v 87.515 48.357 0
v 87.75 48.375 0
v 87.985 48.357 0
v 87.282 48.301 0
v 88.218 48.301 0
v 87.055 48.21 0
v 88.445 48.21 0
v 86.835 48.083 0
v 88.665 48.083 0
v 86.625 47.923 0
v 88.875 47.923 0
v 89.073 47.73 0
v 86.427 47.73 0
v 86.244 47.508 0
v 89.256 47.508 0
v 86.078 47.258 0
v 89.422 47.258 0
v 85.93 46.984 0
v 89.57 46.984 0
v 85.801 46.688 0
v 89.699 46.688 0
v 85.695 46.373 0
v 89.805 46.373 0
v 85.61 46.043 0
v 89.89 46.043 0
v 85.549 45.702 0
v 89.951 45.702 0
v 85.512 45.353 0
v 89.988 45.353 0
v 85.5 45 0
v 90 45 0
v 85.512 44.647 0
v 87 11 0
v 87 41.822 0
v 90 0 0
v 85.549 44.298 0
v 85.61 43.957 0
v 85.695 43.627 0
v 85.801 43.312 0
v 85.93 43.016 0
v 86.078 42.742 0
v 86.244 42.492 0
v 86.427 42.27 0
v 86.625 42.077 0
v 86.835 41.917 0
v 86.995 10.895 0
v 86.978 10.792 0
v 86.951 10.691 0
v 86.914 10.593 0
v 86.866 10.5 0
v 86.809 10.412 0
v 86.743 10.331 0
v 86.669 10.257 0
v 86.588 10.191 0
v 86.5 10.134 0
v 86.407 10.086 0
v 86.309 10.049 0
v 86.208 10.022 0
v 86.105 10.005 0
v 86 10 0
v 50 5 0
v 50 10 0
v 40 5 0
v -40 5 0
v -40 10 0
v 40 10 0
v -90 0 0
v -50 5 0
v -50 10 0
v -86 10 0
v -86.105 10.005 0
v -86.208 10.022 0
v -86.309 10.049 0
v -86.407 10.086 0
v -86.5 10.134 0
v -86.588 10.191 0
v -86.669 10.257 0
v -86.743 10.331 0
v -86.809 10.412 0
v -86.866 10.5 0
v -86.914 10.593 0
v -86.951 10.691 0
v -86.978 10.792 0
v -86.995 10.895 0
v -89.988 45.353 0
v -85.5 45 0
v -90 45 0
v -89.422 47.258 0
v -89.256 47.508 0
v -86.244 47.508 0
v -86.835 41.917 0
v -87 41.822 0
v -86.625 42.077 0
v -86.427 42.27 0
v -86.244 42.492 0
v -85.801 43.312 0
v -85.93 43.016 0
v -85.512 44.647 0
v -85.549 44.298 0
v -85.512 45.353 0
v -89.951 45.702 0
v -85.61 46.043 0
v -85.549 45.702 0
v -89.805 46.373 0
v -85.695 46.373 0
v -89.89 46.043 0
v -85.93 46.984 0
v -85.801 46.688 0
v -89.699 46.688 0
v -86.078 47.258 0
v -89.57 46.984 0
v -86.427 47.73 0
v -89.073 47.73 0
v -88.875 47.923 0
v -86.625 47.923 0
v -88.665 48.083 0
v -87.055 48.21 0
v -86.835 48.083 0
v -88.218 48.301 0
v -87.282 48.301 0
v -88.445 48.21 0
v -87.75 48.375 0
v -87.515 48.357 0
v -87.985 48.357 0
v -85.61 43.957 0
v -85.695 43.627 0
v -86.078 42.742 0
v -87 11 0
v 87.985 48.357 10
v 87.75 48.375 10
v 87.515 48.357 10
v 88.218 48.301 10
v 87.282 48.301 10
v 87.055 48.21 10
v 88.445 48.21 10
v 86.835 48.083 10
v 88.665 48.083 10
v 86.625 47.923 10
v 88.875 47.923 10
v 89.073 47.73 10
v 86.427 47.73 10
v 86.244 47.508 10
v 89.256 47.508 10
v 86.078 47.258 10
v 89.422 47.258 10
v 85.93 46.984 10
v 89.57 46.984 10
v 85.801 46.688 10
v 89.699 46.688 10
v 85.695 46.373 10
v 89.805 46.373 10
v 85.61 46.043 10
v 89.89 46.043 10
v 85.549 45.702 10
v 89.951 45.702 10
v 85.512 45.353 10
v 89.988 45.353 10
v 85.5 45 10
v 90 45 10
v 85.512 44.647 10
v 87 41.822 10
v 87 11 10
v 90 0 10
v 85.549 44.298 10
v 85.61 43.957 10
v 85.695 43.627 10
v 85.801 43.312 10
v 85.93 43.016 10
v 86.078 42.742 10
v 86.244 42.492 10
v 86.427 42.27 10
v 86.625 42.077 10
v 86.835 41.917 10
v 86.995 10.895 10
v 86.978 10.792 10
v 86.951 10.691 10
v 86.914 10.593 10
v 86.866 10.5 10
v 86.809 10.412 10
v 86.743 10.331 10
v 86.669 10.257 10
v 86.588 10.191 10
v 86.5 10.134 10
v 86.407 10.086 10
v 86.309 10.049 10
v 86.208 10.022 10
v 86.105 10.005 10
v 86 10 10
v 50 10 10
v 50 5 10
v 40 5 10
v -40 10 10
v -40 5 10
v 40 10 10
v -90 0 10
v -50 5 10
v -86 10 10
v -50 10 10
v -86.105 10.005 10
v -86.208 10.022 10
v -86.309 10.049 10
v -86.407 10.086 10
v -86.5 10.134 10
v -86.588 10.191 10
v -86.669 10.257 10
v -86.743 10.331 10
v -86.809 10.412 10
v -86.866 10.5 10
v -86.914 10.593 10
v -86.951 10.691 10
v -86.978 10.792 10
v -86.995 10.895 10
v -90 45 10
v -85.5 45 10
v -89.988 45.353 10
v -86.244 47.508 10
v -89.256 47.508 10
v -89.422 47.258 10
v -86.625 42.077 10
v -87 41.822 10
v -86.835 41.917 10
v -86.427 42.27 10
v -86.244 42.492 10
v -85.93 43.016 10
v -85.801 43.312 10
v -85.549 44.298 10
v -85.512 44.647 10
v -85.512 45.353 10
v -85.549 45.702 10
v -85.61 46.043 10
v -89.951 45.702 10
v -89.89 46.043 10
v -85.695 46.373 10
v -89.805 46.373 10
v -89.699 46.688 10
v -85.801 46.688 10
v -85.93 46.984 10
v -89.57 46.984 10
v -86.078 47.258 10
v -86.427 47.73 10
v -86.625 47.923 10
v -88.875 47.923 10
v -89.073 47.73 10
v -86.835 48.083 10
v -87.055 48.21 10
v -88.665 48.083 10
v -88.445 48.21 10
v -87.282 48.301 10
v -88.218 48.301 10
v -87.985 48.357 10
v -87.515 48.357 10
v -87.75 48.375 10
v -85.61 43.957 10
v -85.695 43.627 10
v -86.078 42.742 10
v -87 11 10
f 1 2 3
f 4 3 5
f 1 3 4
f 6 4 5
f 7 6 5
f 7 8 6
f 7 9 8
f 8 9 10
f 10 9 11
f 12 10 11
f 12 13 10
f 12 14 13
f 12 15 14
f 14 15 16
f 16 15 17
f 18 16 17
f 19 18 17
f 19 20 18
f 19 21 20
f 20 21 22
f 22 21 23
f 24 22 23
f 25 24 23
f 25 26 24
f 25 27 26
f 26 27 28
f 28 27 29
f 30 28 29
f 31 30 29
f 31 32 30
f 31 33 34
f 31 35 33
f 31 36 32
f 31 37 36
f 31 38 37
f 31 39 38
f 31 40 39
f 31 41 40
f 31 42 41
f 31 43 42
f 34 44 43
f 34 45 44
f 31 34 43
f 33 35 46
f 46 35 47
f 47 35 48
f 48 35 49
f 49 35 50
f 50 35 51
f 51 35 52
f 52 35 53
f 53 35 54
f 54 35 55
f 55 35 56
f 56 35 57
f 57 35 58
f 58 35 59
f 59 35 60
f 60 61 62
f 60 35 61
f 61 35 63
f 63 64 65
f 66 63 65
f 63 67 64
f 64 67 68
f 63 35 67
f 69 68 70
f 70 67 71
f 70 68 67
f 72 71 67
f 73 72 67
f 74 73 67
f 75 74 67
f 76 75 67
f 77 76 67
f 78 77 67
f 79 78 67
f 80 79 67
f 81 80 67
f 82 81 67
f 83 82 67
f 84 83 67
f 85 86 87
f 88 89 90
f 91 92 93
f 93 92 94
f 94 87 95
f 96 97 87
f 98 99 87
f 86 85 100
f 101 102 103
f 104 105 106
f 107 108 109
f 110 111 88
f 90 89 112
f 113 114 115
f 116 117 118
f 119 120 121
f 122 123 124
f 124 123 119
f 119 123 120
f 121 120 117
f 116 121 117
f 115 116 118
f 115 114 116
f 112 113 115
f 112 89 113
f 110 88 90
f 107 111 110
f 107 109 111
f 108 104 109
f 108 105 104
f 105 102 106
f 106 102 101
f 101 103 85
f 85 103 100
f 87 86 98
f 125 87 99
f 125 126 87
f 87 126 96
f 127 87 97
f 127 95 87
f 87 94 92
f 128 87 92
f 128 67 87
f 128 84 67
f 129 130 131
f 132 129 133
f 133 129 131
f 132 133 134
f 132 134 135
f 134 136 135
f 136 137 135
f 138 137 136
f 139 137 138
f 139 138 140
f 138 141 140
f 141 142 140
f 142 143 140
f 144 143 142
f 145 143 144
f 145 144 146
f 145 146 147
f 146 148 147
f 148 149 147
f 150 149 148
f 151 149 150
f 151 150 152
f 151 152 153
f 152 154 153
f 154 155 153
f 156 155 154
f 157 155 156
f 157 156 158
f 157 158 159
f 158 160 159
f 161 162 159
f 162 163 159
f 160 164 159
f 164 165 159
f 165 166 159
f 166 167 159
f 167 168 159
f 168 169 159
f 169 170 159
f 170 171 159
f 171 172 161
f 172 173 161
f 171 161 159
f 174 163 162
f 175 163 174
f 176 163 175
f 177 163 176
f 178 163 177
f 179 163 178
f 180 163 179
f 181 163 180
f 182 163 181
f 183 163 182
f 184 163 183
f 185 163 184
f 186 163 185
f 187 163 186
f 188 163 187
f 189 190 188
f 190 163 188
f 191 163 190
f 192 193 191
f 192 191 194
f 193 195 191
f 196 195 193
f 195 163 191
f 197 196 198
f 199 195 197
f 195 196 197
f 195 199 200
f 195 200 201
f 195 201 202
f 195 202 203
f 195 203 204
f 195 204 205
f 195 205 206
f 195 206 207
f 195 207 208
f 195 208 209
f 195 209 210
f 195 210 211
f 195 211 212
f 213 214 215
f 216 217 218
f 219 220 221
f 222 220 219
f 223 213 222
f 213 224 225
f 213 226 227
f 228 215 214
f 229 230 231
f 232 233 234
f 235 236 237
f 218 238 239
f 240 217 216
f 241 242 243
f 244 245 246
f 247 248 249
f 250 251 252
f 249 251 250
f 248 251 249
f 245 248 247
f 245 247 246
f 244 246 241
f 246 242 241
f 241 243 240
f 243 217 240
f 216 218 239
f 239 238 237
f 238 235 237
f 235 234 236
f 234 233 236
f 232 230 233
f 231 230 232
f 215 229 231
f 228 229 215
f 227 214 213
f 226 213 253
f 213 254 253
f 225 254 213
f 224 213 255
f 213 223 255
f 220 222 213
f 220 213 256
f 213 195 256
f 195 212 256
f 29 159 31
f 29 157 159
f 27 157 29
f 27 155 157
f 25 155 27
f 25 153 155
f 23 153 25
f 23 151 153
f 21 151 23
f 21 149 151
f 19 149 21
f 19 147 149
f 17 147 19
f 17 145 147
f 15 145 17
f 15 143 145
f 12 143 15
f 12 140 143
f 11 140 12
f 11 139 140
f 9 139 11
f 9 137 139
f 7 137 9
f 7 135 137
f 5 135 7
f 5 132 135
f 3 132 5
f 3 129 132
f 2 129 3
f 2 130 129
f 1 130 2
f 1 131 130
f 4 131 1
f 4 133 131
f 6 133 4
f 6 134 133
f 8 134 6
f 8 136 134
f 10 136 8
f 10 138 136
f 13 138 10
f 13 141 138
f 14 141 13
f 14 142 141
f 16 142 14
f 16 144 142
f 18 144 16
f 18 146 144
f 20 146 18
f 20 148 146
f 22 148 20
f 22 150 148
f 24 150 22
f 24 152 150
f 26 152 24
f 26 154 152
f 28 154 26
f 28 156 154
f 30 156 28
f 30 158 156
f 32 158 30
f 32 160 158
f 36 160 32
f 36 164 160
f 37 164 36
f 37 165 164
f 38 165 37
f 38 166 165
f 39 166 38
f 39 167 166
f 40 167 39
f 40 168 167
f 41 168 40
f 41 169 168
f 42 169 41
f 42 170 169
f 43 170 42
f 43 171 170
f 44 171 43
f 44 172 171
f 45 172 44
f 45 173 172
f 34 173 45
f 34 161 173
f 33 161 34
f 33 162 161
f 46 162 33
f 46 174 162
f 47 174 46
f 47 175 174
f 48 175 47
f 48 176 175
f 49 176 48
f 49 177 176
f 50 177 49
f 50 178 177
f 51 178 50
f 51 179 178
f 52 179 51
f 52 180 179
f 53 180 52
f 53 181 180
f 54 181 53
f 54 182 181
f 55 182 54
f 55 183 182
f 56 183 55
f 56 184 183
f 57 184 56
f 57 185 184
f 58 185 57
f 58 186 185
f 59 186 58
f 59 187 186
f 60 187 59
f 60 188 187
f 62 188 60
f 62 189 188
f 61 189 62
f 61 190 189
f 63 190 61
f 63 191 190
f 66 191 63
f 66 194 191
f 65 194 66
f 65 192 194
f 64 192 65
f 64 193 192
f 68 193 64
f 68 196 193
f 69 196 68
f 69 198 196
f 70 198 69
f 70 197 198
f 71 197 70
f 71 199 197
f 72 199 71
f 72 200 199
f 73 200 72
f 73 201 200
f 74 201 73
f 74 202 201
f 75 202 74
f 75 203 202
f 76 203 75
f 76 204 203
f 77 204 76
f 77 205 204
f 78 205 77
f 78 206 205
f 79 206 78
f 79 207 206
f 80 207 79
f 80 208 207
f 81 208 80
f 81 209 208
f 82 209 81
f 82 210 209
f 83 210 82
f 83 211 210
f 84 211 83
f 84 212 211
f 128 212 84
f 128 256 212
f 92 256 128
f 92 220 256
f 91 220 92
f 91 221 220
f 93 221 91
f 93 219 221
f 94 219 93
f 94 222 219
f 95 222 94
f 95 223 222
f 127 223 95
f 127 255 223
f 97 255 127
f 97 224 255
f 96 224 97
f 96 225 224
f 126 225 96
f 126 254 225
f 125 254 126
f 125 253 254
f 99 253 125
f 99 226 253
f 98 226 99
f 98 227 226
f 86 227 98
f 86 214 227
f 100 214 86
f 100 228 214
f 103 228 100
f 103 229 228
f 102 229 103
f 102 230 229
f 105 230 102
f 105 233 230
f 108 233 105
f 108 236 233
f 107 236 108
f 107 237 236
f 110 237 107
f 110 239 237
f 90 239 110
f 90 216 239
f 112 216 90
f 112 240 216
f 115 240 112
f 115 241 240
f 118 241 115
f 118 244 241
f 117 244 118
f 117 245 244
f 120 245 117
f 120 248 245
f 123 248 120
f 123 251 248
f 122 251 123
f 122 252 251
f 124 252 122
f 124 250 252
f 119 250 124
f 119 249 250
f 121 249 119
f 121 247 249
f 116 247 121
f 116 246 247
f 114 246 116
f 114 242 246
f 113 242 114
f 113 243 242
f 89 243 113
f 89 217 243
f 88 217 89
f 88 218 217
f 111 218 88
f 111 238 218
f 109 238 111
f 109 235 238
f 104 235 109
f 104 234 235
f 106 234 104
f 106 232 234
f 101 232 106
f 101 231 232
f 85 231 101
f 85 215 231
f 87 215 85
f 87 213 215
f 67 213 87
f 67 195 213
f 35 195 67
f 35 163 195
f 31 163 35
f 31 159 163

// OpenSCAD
$fn = 60;


// Dimensions of the power supply, slightly rounded up
power_supply_length = 174;
power_supply_width  =  70;
power_supply_height =  35;

// Material strength
rigid_base = 5;
flex_width = 3;
width      = 10;

// Dimensions of printed parts
length_inner = power_supply_length;
length_total = length_inner + flex_width * 2;
height_inner = power_supply_height;
height_total = height_inner + rigid_base * 2;


holder();


module holder() {
    base_height = height_total - height_inner;

    linear_extrude(width)
    difference() {
        union() {
            polygon([
                [-length_total / 2, 0],
                [ length_total / 2, 0],
                [ length_total / 2, height_total],
                [ length_inner / 2, height_total],
                [ length_inner / 2, base_height],
                [-length_inner / 2, base_height],
                [-length_inner / 2, height_total],
                [-length_total / 2, height_total],
            ]);

            translate([-length_total / 2, height_total])
            lump(1);

            translate([length_total / 2, height_total])
            lump(-1);

            translate([-length_inner / 2, base_height])
            chamfer(1.0);

            translate([length_inner / 2, base_height])
            chamfer(-1.0);
        }

        translate([length_total * 0.25, base_height])
        square([base_height, width], center = true);

        translate([length_total * -0.25, base_height])
        square([base_height, width], center = true);
    }

    module lump(direction) {
        d = flex_width * 1.5;

        translate([d / 2, 0, 0] * direction)
        scale([1, 1.5])
        circle(d = d);
    }

    module chamfer(f) {
        r = 1.0;

        difference() {
            square([r, r] * 2, center = true);

            translate([f * r, r])
            circle(r = r);
        }
    }
}
